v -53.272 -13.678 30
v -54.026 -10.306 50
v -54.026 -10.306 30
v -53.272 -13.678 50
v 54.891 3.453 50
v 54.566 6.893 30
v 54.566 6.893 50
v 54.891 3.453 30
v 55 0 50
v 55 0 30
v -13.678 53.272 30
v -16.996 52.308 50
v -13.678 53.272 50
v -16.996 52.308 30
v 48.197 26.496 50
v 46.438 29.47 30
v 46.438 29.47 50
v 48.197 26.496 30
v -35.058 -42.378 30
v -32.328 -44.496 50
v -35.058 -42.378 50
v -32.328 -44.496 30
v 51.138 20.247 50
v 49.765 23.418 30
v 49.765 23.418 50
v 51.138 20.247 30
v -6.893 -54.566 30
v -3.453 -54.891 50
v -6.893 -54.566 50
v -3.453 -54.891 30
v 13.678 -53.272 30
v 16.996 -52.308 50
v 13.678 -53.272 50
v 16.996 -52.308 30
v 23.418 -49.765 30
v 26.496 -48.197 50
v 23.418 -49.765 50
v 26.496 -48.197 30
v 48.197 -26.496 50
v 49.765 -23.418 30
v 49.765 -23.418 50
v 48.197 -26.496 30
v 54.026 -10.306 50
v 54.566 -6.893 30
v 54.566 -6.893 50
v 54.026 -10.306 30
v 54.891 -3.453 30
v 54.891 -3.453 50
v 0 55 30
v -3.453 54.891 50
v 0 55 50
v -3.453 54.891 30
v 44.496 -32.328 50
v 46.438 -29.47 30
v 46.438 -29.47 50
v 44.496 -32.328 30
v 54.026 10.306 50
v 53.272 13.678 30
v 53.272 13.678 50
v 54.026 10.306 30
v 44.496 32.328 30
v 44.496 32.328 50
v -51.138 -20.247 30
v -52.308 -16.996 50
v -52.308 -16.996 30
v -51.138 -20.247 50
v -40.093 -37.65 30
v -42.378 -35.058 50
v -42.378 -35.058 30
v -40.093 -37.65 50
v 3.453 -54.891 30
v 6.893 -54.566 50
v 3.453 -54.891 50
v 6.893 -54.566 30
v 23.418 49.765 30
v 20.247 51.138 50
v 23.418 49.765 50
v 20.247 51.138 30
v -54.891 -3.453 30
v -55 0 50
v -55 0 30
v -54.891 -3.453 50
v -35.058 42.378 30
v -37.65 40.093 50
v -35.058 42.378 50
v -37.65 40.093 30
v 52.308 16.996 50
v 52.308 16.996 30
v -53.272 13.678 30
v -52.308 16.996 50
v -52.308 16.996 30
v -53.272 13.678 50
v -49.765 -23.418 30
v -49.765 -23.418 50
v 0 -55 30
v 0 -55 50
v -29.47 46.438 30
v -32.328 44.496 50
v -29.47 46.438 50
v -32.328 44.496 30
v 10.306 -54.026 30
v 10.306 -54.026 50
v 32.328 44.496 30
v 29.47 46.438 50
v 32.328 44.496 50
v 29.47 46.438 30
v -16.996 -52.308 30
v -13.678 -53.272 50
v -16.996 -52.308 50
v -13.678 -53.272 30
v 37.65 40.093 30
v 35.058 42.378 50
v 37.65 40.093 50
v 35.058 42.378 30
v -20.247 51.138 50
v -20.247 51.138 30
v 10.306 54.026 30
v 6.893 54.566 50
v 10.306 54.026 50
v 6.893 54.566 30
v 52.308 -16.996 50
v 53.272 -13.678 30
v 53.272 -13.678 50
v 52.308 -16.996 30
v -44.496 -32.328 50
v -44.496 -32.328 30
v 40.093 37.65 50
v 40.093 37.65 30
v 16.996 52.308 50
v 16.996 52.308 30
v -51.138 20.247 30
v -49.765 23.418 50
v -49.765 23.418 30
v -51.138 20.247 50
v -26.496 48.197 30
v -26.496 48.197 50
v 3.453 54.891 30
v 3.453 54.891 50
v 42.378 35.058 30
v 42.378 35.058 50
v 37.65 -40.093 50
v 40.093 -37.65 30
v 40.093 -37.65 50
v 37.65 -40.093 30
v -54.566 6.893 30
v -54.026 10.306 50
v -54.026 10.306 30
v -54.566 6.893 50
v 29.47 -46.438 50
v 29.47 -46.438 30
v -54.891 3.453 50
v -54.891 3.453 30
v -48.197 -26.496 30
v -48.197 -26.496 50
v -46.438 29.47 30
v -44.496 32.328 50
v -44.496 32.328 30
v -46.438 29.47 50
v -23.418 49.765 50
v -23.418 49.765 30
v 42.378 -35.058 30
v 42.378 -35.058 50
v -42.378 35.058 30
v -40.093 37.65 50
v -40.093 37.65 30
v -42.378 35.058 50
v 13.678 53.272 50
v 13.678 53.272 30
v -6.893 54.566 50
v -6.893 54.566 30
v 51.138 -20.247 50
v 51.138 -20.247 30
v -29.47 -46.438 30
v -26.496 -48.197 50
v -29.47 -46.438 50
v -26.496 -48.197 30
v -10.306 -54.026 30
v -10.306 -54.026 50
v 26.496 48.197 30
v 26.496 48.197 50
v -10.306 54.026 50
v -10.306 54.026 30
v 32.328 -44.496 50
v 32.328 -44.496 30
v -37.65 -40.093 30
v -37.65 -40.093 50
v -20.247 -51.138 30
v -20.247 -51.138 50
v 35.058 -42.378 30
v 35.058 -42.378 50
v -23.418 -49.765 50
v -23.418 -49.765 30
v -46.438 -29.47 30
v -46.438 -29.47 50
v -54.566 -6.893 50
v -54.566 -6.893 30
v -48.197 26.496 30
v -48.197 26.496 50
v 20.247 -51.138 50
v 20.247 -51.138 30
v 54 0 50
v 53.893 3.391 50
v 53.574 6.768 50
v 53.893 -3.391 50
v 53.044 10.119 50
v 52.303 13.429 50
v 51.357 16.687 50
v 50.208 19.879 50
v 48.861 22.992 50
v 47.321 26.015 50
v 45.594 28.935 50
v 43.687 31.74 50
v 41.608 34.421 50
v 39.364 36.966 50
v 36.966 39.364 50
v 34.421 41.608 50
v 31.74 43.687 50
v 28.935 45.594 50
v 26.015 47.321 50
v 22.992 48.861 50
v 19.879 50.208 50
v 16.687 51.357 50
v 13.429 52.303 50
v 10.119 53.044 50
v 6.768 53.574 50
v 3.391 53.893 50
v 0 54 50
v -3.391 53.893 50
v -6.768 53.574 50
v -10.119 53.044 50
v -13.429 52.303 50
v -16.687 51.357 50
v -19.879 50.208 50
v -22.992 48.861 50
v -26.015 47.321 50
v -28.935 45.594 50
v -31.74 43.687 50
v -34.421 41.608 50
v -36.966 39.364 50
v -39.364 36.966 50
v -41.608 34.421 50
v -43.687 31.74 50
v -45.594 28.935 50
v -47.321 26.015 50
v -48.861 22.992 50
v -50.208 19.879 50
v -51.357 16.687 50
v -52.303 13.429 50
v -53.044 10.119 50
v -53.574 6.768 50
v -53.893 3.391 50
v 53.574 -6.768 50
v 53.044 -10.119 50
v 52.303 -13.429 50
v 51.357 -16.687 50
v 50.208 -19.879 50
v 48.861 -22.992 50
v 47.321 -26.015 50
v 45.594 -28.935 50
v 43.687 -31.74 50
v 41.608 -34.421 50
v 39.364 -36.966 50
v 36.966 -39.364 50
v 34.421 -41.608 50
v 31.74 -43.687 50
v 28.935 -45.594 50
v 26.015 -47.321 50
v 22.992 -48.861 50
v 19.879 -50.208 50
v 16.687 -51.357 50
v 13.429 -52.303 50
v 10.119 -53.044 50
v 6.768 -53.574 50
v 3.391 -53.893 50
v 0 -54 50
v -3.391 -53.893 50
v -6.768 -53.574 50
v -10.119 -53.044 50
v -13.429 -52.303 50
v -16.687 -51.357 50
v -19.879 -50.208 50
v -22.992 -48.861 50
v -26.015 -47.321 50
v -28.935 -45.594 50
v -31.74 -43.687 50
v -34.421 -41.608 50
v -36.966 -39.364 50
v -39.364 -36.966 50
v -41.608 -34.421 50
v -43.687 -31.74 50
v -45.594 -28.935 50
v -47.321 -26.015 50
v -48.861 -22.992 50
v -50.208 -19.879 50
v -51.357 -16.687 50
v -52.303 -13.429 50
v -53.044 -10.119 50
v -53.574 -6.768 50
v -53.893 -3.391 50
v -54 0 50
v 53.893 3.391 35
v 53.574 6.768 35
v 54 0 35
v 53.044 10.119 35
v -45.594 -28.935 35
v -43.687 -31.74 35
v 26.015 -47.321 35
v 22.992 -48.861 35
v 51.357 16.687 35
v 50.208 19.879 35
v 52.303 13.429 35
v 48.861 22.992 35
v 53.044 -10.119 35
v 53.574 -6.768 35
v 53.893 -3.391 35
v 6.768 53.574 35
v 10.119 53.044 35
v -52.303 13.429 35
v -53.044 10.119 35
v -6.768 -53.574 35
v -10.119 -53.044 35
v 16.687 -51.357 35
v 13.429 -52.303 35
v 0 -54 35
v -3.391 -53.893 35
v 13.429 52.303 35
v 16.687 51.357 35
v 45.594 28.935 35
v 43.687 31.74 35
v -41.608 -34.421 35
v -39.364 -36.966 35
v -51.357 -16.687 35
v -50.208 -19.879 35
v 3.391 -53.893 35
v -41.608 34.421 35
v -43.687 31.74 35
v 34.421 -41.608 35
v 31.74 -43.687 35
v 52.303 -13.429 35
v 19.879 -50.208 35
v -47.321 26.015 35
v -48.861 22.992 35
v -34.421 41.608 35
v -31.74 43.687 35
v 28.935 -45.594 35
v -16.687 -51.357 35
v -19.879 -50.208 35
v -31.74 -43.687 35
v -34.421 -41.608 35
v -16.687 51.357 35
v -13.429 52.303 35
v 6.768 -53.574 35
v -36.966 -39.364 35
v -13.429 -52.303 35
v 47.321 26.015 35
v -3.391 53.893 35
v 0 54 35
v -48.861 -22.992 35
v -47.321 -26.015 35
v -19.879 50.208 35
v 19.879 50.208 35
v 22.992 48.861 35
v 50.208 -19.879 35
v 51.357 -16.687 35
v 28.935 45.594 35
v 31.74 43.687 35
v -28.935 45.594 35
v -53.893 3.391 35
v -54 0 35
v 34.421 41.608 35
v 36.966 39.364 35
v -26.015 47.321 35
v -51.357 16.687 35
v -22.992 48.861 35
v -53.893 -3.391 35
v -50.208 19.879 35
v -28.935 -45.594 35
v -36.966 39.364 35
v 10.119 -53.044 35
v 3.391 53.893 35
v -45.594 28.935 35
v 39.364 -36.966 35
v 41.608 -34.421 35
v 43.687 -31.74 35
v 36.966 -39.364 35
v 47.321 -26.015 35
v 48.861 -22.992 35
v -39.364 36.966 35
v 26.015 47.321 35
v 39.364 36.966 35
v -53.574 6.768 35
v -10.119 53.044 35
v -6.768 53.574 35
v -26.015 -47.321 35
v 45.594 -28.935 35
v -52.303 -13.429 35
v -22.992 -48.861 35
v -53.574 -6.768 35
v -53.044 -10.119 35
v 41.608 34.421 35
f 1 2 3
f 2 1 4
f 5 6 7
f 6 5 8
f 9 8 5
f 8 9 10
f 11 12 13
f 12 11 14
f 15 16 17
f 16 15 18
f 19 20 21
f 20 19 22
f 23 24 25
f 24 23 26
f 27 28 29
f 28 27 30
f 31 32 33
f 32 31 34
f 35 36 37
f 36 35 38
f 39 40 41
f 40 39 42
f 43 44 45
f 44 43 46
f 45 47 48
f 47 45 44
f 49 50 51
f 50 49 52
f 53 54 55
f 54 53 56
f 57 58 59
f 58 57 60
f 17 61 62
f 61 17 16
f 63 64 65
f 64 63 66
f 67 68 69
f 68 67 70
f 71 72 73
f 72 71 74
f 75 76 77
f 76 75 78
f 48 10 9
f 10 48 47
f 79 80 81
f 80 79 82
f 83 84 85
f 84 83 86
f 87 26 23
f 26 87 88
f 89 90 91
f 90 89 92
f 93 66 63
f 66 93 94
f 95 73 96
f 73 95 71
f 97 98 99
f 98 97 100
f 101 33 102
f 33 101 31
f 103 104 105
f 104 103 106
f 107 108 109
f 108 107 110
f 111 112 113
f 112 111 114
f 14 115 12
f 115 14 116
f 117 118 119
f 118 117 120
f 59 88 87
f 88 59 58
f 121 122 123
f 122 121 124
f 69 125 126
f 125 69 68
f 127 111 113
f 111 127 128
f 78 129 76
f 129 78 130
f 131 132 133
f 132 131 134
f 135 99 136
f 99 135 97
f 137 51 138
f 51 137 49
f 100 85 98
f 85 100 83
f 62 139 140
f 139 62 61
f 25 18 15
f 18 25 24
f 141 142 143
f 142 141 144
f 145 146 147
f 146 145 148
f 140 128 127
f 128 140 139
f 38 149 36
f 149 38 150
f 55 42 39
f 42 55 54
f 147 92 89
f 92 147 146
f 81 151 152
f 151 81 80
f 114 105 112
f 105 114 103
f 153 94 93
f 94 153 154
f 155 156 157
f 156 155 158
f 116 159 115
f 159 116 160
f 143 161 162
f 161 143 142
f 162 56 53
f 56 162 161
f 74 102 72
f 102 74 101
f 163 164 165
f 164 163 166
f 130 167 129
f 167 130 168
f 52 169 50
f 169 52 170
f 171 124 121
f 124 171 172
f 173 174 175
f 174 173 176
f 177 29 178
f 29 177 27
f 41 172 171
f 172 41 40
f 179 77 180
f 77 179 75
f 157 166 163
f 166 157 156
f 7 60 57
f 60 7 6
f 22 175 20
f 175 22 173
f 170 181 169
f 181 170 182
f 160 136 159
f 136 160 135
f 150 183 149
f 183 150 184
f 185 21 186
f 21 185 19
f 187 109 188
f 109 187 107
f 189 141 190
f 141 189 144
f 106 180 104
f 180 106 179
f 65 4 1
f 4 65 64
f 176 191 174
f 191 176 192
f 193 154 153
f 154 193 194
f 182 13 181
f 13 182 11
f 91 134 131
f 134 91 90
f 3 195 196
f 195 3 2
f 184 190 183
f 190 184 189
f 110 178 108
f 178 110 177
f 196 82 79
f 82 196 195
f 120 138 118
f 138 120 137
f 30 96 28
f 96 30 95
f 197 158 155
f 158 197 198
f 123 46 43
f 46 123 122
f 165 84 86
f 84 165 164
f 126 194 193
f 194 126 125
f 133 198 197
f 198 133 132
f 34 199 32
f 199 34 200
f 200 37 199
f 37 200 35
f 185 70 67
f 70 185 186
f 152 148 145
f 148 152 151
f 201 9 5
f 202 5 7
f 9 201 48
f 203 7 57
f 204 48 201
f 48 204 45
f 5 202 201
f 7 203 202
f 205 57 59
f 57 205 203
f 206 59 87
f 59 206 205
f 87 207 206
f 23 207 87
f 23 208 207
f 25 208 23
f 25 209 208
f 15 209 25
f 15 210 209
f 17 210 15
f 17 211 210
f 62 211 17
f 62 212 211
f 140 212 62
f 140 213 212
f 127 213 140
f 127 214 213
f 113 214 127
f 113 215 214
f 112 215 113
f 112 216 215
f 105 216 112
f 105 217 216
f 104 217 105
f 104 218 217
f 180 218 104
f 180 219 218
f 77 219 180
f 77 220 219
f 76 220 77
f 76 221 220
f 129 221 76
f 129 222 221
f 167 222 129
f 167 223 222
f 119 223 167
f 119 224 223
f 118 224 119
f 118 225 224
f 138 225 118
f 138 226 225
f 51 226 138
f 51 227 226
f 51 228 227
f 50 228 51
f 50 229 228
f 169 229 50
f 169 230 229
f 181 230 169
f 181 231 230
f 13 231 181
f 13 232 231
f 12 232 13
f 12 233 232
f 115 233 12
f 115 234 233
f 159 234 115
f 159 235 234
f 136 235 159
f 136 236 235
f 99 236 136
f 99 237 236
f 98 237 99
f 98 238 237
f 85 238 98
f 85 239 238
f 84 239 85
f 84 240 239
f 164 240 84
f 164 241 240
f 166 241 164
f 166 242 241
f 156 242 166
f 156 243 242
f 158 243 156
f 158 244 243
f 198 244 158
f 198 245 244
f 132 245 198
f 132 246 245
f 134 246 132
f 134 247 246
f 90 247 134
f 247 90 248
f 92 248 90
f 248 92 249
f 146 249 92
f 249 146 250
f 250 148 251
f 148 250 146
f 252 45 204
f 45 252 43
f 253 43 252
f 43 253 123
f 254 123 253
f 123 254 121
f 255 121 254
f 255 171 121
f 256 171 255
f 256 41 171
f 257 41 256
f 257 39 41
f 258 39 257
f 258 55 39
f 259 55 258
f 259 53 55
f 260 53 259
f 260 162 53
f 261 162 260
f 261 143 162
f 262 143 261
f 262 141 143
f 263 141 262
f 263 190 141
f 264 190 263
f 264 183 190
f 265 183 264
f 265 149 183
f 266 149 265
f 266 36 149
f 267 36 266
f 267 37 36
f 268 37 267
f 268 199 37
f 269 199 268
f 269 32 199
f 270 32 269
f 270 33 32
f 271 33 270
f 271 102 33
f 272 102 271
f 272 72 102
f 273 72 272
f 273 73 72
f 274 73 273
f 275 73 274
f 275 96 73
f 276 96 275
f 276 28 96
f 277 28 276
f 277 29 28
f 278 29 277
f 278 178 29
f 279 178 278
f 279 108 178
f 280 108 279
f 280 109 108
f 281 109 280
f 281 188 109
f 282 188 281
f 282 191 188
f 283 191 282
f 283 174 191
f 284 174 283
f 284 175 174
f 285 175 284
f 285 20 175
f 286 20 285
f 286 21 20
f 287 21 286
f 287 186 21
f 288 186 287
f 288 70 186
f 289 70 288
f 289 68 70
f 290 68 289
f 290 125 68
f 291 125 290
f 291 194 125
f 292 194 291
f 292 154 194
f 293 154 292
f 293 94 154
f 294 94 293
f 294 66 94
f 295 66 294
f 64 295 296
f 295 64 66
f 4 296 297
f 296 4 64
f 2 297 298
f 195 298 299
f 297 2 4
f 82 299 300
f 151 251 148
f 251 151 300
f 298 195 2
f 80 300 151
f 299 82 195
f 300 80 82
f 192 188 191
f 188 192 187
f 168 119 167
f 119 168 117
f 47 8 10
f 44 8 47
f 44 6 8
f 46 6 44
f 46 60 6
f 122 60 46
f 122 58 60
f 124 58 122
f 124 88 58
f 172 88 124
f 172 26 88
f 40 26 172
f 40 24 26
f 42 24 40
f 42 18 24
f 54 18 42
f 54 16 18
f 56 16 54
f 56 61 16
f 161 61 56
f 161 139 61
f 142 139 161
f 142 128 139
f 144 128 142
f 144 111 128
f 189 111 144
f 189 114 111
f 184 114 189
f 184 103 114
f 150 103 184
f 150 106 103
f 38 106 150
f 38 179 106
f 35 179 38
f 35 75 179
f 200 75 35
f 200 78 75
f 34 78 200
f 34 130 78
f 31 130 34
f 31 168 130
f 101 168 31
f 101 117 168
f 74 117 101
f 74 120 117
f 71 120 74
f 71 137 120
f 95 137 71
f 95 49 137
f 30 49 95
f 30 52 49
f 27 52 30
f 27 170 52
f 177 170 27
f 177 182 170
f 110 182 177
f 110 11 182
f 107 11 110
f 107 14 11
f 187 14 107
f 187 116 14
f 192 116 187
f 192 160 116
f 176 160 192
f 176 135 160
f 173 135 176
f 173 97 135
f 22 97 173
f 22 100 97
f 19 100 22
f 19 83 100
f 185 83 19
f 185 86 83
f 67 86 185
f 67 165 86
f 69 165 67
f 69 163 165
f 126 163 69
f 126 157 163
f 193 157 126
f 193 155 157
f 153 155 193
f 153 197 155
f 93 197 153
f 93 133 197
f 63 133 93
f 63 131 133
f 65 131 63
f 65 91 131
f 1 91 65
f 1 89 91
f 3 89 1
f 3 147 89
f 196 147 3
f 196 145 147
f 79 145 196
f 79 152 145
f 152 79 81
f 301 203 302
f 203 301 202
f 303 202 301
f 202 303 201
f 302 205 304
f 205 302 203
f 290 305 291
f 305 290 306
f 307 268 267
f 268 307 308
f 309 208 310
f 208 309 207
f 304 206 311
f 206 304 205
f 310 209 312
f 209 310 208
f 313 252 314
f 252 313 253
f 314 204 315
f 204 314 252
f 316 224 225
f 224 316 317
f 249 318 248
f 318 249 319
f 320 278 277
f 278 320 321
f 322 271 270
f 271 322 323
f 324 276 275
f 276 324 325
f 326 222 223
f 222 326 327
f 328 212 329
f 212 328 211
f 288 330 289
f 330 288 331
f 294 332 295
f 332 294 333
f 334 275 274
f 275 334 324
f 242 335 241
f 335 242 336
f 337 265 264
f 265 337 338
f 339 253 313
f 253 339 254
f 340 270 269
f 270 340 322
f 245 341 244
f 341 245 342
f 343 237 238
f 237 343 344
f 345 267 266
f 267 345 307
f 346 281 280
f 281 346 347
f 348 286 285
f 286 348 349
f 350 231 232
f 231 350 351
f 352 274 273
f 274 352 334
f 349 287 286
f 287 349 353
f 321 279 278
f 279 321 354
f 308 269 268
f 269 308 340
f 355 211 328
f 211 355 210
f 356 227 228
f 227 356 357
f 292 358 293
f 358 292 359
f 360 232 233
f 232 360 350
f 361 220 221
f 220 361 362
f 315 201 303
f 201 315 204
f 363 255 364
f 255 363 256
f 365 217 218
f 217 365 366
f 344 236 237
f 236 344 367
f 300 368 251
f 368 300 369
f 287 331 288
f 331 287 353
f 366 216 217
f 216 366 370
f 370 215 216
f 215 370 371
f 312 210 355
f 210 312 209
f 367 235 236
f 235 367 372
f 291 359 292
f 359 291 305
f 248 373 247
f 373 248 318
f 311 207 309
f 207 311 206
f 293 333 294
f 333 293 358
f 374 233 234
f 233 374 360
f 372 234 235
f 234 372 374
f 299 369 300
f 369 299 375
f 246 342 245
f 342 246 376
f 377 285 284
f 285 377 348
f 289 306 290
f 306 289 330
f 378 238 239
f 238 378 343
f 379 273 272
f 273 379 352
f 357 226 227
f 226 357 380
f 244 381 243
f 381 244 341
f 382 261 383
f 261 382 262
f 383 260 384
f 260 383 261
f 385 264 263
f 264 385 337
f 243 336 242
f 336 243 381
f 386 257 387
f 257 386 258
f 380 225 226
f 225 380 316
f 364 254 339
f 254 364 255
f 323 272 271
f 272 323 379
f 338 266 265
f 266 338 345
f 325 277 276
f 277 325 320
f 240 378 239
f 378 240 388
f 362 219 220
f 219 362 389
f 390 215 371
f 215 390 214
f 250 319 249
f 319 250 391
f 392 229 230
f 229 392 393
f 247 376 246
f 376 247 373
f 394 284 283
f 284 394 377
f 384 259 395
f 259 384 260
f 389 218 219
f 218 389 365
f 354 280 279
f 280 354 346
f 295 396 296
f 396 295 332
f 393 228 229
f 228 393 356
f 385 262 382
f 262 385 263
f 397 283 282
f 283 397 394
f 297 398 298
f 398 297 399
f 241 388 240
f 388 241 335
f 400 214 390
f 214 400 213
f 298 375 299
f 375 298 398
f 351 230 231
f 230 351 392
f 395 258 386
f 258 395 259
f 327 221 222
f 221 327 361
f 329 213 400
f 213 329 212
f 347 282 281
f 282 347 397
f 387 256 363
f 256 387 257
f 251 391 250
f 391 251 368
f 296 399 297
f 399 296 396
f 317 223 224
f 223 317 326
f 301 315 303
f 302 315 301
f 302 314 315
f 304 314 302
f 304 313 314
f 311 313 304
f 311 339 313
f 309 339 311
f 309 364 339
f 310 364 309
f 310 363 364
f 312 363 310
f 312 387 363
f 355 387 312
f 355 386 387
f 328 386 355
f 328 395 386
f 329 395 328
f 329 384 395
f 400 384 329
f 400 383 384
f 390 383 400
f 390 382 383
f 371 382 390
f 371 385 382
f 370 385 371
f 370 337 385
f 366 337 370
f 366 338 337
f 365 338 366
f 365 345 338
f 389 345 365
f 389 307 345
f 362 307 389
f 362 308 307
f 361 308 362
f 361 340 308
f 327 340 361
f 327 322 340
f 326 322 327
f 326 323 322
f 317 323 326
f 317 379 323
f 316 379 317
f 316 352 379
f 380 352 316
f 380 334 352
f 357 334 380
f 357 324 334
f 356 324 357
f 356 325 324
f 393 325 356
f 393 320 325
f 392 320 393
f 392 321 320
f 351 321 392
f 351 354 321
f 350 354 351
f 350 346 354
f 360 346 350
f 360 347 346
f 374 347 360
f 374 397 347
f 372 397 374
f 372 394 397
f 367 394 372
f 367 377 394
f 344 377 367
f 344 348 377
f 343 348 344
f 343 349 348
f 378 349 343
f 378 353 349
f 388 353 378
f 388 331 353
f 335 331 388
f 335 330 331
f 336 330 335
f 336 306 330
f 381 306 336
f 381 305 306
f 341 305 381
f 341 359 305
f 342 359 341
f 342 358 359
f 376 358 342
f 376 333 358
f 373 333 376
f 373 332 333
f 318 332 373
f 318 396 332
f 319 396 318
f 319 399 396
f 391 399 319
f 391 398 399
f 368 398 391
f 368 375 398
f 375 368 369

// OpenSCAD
// file: ../configurations/global.scad
knob_facade_a_piece_height = 20;
knob_facade_a_piece_diameter = 100;
knob_facade_a_piece_wall_thickness = 2;

knob_facade_b_piece_height = 20;
knob_facade_b_piece_diameter = 110;
knob_facade_b_piece_wall_thickness = 2;

top_facade_piece_z_size = 5;
top_facade_piece_z_diameter = 110;

top_component_top_facade_piece_z = 30;


sound_roll_component_top_component_position = [0,0,50];
sound_roll_component_bottom_component_position = [0,0,0];
sound_roll_component_battery_custom_position = [- 75.5 / 2, -21.4 / 2, 0];

throw_3mm_diameter = 3;
// file: ../pieces/TopFacadePiece.scad
include <../configurations/global.scad>;

module TopFacadePiece(
    z_size = top_facade_piece_z_size,
    diameter = top_facade_piece_z_diameter,
) {
    cylinder(h = z_size, d = diameter, $fn=100);
}


TopFacadePiece();
// file: ../pieces/knobFacadeBPiece.scad
include <../configurations/global.scad>;

module knobFacadeBPiece(
    height = knob_facade_b_piece_height,
    diameter = knob_facade_b_piece_diameter,
    wall_thickness = knob_facade_b_piece_wall_thickness
) {
    difference() {
        cylinder(h = height, d = diameter, $fn=100);
        translate([0, 0, -1])
        cylinder(h = height + 2, d = diameter - wall_thickness, $fn=100);
    }
}

knobFacadeBPiece();
// main file
use <../pieces/knobFacadeBPiece.scad>
use <../pieces/TopFacadePiece.scad>
include <../configurations/global.scad>

module TopComponent(
    top_facade_piece_z = top_component_top_facade_piece_z
) {
        translate([0, 0, top_facade_piece_z]) {
            TopFacadePiece();
            knobFacadeBPiece();
        }
}

TopComponent();
